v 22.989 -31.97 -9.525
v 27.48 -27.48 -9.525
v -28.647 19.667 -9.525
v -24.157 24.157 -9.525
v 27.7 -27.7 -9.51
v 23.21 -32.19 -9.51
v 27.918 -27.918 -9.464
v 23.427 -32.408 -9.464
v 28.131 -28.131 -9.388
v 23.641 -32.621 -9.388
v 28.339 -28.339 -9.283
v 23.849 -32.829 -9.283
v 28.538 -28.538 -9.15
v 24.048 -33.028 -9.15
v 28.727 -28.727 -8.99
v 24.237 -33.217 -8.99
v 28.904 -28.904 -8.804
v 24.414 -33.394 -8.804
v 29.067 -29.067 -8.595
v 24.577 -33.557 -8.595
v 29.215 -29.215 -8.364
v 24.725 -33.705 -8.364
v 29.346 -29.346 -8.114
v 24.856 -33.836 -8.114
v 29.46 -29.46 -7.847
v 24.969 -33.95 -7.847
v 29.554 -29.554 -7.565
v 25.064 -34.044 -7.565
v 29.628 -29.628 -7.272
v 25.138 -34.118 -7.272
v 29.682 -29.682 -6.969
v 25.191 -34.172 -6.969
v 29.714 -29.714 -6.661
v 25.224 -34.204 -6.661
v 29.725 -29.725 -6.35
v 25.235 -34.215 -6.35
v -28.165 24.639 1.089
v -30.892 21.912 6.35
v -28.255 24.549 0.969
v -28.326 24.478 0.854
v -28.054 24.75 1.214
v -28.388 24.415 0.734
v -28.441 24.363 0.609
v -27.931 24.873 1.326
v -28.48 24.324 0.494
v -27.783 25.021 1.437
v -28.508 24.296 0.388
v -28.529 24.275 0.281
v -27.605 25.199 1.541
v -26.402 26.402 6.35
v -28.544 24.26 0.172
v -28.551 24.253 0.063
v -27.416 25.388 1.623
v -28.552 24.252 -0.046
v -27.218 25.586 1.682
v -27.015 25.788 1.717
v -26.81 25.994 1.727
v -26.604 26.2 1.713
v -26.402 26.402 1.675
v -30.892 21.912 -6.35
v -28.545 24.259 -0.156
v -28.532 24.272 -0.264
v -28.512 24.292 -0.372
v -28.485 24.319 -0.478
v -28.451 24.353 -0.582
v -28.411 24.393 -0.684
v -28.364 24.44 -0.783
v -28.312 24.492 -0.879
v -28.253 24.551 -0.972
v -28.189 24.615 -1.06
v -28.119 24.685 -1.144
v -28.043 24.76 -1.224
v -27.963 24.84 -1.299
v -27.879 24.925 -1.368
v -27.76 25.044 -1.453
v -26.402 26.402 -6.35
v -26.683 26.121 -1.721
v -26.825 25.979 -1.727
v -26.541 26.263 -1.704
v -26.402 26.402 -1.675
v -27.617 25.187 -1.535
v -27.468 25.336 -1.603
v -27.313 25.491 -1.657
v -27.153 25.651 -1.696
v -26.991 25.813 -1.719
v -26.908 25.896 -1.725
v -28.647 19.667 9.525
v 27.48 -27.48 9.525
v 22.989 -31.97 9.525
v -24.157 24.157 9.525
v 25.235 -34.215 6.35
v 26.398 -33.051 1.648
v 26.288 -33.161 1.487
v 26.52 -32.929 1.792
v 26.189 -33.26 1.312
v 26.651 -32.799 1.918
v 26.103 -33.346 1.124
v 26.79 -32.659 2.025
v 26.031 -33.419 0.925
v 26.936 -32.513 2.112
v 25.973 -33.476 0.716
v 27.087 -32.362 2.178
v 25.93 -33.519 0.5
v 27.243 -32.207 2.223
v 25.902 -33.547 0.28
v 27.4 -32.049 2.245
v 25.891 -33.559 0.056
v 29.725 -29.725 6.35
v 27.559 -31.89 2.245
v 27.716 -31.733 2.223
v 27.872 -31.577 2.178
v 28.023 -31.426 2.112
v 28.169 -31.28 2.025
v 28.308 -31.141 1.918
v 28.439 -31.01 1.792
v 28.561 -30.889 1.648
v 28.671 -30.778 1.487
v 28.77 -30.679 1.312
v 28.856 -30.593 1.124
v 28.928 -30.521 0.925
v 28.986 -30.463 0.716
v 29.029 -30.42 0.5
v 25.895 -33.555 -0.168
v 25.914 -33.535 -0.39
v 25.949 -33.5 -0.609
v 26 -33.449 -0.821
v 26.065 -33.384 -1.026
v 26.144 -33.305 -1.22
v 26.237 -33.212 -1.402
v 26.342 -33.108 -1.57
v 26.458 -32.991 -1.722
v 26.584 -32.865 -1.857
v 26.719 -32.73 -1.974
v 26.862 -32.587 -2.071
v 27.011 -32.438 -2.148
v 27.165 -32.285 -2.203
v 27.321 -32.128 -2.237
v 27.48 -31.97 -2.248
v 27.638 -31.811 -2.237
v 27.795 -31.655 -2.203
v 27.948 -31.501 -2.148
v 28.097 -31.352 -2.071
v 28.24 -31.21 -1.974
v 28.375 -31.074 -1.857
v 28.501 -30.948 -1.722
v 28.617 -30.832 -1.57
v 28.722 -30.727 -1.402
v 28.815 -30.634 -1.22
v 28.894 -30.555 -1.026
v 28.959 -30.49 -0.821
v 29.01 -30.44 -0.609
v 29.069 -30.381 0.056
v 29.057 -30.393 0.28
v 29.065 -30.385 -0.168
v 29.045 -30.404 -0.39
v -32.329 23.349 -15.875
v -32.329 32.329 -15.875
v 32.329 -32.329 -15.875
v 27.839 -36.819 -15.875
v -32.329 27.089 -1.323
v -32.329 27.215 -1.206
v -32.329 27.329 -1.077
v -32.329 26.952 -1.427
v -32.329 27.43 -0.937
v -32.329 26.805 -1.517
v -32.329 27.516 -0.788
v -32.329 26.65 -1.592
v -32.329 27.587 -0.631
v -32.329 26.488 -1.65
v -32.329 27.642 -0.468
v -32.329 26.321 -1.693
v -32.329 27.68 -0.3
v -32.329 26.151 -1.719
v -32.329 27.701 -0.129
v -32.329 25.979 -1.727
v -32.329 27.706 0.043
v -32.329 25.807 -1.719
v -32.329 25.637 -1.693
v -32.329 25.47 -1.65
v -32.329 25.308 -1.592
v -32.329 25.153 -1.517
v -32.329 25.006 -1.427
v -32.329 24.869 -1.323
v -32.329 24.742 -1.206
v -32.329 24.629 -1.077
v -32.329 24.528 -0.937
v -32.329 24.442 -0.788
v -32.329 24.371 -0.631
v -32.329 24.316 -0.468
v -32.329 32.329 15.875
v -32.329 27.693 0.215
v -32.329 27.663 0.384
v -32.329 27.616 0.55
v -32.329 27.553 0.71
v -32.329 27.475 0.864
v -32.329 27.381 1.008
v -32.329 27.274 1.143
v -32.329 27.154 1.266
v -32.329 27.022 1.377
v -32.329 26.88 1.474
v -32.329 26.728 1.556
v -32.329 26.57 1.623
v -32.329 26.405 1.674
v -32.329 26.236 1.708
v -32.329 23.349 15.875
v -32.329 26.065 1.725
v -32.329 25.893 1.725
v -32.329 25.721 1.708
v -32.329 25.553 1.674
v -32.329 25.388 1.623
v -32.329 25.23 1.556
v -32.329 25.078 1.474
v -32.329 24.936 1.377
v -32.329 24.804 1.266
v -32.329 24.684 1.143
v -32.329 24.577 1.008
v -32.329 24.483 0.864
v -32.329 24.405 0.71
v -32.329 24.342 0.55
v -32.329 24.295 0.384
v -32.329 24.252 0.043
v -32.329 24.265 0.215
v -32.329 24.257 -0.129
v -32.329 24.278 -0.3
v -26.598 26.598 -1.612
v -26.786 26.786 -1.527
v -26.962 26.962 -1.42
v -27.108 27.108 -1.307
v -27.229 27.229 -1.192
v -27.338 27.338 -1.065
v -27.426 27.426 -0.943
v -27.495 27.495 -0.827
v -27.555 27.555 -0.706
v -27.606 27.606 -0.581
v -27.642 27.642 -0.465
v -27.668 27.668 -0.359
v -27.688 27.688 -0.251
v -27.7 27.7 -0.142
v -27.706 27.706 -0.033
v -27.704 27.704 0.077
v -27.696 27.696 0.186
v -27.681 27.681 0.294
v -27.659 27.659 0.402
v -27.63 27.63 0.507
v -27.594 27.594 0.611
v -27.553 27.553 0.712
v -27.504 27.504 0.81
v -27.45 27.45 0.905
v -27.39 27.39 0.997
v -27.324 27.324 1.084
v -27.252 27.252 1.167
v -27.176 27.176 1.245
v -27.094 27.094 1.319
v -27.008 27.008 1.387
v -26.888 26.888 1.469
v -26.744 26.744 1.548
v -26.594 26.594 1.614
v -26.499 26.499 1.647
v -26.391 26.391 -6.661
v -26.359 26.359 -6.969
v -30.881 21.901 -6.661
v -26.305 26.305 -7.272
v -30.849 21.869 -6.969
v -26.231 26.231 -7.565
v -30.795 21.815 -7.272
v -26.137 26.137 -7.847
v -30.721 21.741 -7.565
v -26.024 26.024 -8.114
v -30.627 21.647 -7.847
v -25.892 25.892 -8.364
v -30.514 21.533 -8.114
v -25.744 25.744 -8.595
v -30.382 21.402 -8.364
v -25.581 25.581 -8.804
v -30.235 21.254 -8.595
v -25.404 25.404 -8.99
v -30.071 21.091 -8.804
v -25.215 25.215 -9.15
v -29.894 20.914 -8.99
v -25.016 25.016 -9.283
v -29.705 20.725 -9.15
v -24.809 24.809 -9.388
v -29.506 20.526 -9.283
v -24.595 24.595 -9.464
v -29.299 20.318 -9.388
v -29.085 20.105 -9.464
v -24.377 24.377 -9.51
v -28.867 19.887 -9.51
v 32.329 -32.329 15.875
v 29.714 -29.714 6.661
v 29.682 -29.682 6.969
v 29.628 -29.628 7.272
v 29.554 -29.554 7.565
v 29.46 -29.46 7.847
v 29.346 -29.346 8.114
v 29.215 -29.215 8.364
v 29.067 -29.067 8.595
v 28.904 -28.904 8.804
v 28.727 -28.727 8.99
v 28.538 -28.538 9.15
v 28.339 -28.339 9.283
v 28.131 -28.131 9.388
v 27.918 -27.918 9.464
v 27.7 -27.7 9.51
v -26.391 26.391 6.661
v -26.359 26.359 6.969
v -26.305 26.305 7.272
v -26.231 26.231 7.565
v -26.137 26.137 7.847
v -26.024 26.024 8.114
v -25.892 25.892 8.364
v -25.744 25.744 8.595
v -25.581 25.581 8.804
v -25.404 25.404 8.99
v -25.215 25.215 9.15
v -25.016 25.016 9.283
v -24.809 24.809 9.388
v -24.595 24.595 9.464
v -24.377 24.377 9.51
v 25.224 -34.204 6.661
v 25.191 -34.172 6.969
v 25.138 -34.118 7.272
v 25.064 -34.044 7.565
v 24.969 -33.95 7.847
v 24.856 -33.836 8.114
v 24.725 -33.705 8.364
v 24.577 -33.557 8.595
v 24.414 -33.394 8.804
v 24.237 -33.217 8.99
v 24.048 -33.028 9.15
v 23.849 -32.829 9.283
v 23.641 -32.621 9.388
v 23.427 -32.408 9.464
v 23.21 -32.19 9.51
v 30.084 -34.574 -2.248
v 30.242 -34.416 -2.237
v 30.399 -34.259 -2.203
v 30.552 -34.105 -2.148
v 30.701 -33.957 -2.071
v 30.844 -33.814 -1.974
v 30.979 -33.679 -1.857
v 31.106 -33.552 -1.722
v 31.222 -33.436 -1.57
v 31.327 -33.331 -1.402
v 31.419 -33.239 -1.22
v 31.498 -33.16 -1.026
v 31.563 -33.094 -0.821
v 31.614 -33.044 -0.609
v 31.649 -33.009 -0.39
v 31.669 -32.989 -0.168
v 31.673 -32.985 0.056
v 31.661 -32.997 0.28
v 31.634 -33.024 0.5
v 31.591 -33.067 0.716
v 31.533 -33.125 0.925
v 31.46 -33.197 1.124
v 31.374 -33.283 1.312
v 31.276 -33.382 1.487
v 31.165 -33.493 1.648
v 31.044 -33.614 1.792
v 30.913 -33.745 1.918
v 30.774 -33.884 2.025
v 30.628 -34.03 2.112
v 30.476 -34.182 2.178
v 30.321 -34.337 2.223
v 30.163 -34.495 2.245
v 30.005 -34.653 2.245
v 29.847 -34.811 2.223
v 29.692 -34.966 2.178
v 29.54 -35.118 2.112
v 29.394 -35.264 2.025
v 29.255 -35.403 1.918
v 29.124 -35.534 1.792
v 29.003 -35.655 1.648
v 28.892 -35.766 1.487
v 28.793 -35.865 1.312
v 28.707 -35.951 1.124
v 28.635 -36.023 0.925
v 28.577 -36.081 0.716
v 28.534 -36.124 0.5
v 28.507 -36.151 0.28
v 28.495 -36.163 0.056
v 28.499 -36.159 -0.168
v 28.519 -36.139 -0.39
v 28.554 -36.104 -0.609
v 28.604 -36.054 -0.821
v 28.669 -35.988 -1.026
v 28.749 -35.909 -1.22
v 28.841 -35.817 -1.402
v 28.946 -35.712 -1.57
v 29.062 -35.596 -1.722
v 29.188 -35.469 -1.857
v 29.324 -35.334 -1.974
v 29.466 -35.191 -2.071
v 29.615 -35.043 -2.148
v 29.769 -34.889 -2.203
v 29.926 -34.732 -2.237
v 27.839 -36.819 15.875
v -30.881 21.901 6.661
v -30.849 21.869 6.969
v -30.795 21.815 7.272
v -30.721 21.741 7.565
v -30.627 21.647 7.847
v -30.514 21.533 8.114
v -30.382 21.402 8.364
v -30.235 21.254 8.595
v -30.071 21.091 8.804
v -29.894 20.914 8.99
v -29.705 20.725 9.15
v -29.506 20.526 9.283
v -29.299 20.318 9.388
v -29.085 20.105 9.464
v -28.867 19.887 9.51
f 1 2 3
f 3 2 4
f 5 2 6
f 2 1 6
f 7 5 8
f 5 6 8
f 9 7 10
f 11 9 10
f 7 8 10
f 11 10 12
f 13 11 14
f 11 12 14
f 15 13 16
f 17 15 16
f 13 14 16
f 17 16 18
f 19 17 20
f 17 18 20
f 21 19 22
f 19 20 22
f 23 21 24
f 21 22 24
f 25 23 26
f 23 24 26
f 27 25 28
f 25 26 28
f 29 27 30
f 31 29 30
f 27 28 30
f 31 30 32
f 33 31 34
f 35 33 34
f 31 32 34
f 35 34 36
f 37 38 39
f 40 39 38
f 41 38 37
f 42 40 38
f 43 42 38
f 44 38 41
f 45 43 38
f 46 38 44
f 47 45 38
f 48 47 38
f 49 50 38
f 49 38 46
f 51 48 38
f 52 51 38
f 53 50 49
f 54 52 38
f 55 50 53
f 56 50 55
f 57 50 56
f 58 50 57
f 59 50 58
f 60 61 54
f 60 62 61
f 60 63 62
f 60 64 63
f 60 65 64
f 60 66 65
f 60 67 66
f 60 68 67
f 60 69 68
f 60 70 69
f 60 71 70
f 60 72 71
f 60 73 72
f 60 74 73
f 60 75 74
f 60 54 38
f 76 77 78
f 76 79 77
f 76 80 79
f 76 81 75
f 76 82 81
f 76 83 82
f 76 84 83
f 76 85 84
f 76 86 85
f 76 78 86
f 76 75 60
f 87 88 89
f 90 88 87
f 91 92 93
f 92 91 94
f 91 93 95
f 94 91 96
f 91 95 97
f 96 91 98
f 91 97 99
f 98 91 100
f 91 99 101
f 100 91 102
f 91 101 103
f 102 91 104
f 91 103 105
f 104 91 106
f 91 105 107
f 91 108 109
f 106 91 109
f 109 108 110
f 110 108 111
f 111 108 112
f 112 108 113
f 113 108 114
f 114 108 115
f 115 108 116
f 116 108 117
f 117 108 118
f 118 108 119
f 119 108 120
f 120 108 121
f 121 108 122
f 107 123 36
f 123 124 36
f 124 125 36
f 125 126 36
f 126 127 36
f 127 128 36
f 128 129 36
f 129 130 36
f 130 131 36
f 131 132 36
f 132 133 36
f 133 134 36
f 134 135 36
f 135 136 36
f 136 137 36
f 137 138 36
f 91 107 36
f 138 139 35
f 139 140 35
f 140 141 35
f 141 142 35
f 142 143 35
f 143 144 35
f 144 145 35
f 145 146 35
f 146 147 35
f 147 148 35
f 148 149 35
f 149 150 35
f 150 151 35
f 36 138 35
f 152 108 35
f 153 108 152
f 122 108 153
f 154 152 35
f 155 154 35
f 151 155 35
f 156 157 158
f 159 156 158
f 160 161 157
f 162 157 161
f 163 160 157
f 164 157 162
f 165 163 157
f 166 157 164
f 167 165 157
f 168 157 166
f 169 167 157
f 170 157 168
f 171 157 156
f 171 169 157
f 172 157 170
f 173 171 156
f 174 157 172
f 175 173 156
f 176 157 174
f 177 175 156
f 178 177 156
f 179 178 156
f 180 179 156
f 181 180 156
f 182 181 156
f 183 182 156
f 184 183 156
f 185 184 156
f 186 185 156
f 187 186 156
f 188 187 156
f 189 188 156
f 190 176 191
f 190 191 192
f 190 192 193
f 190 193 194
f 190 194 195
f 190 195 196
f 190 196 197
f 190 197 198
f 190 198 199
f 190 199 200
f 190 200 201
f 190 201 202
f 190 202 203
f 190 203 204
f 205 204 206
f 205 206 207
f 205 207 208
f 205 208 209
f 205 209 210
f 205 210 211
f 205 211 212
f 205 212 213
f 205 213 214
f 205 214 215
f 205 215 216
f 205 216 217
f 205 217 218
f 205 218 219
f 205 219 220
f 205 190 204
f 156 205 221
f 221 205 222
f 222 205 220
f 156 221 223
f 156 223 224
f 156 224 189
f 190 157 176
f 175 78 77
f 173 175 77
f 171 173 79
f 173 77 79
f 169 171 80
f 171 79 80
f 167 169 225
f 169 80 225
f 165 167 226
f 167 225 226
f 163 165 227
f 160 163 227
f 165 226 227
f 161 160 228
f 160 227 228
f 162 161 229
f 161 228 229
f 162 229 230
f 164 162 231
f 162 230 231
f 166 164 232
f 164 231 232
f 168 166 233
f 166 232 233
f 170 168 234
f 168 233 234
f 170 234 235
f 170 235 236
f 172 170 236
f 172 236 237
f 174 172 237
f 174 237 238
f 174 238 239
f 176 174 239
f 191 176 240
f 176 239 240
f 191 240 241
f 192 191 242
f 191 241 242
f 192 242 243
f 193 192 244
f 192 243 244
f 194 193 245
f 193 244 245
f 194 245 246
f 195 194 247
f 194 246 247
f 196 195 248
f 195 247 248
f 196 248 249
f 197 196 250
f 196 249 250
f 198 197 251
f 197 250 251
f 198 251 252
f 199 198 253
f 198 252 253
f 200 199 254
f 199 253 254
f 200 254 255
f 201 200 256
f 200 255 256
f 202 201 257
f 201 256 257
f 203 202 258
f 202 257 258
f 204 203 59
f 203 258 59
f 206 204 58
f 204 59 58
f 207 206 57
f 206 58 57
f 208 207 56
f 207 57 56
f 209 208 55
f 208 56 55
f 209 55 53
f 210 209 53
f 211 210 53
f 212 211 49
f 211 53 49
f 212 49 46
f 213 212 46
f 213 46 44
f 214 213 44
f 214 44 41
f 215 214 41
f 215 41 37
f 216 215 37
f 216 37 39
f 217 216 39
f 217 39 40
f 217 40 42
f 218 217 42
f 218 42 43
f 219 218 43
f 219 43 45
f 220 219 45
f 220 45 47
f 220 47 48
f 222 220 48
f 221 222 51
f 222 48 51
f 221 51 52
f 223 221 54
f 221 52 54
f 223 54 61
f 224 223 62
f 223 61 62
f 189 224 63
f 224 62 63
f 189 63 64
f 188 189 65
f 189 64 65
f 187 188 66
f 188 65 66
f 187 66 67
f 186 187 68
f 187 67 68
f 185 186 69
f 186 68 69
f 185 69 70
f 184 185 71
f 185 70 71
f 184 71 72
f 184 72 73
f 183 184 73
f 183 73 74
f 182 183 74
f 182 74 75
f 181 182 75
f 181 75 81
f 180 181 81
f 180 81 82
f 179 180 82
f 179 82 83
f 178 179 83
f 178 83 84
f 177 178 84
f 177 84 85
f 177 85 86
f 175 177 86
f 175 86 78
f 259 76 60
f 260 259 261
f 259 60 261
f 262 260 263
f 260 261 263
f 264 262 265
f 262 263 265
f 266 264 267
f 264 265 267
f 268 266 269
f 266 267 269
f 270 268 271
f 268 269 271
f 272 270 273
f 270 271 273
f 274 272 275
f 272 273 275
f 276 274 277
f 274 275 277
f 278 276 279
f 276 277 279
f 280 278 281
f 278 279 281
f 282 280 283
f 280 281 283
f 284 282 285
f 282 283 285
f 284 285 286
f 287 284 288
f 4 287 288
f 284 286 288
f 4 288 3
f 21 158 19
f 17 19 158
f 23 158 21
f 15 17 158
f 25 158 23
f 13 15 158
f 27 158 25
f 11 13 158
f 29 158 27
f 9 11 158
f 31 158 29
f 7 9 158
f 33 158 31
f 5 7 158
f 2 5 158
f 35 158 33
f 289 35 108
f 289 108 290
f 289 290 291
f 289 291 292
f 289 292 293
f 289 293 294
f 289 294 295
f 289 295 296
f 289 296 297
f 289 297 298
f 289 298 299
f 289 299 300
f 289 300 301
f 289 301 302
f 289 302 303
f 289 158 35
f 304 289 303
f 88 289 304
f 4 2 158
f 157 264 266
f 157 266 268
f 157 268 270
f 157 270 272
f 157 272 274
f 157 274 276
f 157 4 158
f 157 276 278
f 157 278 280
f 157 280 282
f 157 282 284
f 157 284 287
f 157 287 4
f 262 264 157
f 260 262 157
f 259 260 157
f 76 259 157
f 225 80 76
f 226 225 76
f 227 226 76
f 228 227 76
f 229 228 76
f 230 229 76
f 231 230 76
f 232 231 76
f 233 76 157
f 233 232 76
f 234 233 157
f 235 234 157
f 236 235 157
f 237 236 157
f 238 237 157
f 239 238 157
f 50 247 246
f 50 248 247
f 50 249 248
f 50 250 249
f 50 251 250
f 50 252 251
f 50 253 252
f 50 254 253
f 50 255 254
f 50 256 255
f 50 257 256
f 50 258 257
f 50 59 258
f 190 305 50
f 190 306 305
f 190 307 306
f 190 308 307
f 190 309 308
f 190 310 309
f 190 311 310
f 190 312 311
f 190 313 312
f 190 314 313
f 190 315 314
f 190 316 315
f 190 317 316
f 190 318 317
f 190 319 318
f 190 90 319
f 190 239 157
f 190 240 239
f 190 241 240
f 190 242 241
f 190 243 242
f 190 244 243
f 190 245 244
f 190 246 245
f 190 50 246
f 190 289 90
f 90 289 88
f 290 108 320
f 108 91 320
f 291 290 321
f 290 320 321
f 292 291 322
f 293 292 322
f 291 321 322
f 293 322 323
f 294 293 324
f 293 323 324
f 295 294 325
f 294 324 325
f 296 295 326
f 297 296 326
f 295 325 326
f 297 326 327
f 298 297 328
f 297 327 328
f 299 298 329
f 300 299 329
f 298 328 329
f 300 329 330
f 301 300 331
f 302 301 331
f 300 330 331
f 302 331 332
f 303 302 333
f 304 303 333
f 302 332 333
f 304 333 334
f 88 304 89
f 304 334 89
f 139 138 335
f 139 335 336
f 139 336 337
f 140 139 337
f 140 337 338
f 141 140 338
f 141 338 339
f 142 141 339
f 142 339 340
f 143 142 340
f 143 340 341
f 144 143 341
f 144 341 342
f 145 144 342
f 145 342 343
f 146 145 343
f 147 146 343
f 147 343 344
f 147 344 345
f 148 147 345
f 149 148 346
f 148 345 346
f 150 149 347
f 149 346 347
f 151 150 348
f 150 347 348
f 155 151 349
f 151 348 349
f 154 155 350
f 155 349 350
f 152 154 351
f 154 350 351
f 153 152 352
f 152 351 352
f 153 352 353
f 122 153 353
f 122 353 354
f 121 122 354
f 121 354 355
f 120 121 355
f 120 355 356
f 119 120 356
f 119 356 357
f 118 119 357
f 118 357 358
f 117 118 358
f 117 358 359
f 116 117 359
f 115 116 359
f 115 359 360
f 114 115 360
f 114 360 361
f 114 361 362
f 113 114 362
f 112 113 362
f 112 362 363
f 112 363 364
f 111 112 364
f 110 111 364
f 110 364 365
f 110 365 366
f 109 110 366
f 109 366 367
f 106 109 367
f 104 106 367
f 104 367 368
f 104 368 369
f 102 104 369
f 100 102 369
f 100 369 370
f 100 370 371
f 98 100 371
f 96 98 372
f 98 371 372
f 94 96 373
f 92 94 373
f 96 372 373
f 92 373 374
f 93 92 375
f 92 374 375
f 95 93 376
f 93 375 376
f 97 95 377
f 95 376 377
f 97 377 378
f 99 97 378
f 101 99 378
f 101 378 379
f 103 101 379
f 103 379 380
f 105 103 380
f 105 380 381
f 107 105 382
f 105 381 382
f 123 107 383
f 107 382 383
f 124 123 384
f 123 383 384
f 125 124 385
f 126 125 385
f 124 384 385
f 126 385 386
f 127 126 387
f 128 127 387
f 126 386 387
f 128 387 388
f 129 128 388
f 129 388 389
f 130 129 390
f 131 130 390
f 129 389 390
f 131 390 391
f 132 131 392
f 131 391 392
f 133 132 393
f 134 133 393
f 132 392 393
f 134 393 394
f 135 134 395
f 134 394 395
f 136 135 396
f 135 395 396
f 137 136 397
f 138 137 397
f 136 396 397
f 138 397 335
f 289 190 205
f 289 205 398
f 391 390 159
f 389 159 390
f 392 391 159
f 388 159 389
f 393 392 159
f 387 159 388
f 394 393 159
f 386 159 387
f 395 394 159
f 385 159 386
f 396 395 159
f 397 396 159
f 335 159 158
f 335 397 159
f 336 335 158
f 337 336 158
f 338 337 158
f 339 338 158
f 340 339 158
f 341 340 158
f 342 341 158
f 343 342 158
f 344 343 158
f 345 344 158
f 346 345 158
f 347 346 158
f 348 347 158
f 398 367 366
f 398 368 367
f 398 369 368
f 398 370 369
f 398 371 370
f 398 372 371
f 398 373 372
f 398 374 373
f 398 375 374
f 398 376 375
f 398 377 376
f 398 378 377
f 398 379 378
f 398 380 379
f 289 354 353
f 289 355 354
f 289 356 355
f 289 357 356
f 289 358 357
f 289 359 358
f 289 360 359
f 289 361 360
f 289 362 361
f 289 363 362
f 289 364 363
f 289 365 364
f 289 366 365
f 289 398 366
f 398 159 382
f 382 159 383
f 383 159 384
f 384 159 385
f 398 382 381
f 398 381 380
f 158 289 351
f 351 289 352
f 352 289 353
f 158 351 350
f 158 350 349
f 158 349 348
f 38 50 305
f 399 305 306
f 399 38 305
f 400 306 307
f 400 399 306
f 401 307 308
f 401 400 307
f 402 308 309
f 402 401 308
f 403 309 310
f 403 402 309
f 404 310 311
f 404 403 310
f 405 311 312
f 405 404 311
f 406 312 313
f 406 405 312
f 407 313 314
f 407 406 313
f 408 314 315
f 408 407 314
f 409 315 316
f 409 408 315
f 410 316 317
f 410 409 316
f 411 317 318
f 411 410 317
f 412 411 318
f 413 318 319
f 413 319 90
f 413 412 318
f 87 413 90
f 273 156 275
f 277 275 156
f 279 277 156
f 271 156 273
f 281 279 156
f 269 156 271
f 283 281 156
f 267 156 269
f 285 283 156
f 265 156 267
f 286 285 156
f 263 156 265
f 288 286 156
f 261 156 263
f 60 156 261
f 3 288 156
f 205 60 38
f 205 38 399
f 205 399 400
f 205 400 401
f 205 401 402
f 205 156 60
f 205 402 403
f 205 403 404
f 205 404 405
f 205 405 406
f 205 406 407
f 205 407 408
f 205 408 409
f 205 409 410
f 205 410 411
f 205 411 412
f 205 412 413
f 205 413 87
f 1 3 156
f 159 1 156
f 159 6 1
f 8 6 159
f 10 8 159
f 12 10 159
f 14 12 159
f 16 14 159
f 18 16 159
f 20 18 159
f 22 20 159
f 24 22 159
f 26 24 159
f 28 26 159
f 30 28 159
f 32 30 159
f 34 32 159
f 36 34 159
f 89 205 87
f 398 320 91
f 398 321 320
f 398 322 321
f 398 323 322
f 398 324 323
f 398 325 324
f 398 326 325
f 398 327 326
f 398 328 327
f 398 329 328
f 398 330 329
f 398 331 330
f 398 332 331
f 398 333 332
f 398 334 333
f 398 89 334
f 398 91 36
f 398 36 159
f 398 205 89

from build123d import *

# Parameters (mm, degrees)
BOSS_EXTRUDE1_DEPTH       = 15.875
SKETCH2_W                 = 19.05
SKETCH2_H                 = 79.375
CUT_EXTRUDE1_DEPTH        = 12.7
FILLET1_R                 = 3.175
F_8_CLEARANCE_HOLE1_D     = 4.4958
F_8_CLEARANCE_HOLE1_DEPTH = 16.51
F_8_CLEARANCE_HOLE1_TIP   = 1.350674586
F_8_32_TAPPED_HOLE1_D     = 3.4544


with BuildPart() as part:
    # Sketch1 → Boss-Extrude1 (new, symmetric)
    with BuildSketch(Plane.XY):
        Polygon((-32.328922036, 32.328922036), (-32.328922036, 23.348665915), (27.838793975, -36.819050096), (32.328922036, -32.328922036), align=None)
    extrude(amount=BOSS_EXTRUDE1_DEPTH, both=True)

    # Sketch2 → Cut-Extrude1 (cut)
    with BuildSketch(Plane(origin=(0, 0, 0), x_dir=(0, 0, -1), z_dir=(0.7071067811865461, 0.707106781186549, 0))):
        with Locations((0, -2.3495)):
            Rectangle(SKETCH2_W, SKETCH2_H)
    extrude(amount=-CUT_EXTRUDE1_DEPTH, mode=Mode.SUBTRACT)

    # Fillet1
    fillet1_edges = [part.edges().sort_by_distance(p)[0] for p in [
        (27.47958373, -31.969711791, 9.525),
        (-28.647017026, 24.156888966, 9.525),
        (-28.647017026, 24.156888966, -9.525),
        (27.47958373, -31.969711791, -9.525),
    ]]
    fillet(fillet1_edges, radius=FILLET1_R)

    # #8 Clearance Hole1
    with Locations(Plane(origin=(29.724647761, -29.724647761, 0), x_dir=(0, 0, 1), z_dir=(-0.7071067811865489, 0.7071067811865462, 0))):
        with Locations((0, -3.175)):
            Hole(F_8_CLEARANCE_HOLE1_D / 2, depth=F_8_CLEARANCE_HOLE1_DEPTH)
            with Locations((0, 0, -(F_8_CLEARANCE_HOLE1_DEPTH + F_8_CLEARANCE_HOLE1_TIP / 2))):  # 118° drill point
                Cone(0, F_8_CLEARANCE_HOLE1_D / 2, F_8_CLEARANCE_HOLE1_TIP, mode=Mode.SUBTRACT)

    # #8-32 Tapped Hole1 (through all)
    with Locations(Plane.ZY.offset(32.328922036)):
        with Locations((0, 25.978922036)):
            Hole(F_8_32_TAPPED_HOLE1_D / 2)


solid = part.part
